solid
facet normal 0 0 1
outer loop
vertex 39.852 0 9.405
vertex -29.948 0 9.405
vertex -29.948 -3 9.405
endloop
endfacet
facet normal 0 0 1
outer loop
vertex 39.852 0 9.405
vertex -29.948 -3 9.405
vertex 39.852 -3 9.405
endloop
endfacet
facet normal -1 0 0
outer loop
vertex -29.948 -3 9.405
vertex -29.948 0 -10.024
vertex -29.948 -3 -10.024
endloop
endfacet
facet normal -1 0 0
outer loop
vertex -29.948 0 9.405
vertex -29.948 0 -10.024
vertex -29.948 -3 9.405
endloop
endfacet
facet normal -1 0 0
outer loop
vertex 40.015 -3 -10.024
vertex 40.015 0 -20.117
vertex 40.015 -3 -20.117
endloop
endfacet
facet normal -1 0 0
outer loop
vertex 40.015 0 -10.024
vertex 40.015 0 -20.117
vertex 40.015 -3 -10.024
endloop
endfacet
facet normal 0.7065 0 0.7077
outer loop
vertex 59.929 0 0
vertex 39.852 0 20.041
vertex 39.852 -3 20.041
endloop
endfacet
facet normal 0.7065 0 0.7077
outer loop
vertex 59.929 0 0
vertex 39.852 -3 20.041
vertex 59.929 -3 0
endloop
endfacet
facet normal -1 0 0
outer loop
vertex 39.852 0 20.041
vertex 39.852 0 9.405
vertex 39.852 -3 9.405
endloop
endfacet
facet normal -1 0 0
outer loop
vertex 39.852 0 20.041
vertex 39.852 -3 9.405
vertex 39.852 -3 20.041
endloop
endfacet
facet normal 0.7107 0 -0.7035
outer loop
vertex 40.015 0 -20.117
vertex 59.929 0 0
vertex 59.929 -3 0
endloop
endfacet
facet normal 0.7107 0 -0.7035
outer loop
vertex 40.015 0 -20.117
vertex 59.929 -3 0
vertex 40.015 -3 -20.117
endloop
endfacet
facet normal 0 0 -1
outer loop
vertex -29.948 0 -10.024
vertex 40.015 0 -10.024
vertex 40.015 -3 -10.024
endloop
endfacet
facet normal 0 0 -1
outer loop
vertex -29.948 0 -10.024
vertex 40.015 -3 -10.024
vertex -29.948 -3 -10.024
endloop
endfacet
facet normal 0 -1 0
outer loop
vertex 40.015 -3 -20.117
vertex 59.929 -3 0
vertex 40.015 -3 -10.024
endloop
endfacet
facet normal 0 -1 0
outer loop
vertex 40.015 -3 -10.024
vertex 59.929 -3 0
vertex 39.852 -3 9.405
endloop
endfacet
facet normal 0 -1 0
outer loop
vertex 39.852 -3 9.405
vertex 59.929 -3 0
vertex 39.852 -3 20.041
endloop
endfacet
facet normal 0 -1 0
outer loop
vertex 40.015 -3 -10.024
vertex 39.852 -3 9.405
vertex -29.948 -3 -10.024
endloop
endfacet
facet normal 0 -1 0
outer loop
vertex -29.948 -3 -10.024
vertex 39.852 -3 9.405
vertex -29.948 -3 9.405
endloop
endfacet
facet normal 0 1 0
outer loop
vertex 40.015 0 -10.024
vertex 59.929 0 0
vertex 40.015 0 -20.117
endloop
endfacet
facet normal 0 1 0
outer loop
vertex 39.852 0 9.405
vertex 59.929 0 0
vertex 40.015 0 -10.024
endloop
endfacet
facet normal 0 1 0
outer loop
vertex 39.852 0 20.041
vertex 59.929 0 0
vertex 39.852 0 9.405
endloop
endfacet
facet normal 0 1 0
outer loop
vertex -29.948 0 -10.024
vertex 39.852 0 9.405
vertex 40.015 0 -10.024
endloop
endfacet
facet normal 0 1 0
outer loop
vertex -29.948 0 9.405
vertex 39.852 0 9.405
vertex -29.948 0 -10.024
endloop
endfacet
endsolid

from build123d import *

# Parameters (mm, degrees)
PAD_DEPTH = 3


with BuildPart() as part:
    # Sketch → Pad (new body)
    with BuildSketch(Plane.XZ):
        Polygon((-29.947879, 9.404758), (39.852381, 9.404758), (39.852381, 20.041461), (59.928709, 0), (40.015407, -20.117136), (40.015407, -10.023776), (-29.947879, -10.023776), align=None)
    extrude(amount=PAD_DEPTH)


solid = part.part
